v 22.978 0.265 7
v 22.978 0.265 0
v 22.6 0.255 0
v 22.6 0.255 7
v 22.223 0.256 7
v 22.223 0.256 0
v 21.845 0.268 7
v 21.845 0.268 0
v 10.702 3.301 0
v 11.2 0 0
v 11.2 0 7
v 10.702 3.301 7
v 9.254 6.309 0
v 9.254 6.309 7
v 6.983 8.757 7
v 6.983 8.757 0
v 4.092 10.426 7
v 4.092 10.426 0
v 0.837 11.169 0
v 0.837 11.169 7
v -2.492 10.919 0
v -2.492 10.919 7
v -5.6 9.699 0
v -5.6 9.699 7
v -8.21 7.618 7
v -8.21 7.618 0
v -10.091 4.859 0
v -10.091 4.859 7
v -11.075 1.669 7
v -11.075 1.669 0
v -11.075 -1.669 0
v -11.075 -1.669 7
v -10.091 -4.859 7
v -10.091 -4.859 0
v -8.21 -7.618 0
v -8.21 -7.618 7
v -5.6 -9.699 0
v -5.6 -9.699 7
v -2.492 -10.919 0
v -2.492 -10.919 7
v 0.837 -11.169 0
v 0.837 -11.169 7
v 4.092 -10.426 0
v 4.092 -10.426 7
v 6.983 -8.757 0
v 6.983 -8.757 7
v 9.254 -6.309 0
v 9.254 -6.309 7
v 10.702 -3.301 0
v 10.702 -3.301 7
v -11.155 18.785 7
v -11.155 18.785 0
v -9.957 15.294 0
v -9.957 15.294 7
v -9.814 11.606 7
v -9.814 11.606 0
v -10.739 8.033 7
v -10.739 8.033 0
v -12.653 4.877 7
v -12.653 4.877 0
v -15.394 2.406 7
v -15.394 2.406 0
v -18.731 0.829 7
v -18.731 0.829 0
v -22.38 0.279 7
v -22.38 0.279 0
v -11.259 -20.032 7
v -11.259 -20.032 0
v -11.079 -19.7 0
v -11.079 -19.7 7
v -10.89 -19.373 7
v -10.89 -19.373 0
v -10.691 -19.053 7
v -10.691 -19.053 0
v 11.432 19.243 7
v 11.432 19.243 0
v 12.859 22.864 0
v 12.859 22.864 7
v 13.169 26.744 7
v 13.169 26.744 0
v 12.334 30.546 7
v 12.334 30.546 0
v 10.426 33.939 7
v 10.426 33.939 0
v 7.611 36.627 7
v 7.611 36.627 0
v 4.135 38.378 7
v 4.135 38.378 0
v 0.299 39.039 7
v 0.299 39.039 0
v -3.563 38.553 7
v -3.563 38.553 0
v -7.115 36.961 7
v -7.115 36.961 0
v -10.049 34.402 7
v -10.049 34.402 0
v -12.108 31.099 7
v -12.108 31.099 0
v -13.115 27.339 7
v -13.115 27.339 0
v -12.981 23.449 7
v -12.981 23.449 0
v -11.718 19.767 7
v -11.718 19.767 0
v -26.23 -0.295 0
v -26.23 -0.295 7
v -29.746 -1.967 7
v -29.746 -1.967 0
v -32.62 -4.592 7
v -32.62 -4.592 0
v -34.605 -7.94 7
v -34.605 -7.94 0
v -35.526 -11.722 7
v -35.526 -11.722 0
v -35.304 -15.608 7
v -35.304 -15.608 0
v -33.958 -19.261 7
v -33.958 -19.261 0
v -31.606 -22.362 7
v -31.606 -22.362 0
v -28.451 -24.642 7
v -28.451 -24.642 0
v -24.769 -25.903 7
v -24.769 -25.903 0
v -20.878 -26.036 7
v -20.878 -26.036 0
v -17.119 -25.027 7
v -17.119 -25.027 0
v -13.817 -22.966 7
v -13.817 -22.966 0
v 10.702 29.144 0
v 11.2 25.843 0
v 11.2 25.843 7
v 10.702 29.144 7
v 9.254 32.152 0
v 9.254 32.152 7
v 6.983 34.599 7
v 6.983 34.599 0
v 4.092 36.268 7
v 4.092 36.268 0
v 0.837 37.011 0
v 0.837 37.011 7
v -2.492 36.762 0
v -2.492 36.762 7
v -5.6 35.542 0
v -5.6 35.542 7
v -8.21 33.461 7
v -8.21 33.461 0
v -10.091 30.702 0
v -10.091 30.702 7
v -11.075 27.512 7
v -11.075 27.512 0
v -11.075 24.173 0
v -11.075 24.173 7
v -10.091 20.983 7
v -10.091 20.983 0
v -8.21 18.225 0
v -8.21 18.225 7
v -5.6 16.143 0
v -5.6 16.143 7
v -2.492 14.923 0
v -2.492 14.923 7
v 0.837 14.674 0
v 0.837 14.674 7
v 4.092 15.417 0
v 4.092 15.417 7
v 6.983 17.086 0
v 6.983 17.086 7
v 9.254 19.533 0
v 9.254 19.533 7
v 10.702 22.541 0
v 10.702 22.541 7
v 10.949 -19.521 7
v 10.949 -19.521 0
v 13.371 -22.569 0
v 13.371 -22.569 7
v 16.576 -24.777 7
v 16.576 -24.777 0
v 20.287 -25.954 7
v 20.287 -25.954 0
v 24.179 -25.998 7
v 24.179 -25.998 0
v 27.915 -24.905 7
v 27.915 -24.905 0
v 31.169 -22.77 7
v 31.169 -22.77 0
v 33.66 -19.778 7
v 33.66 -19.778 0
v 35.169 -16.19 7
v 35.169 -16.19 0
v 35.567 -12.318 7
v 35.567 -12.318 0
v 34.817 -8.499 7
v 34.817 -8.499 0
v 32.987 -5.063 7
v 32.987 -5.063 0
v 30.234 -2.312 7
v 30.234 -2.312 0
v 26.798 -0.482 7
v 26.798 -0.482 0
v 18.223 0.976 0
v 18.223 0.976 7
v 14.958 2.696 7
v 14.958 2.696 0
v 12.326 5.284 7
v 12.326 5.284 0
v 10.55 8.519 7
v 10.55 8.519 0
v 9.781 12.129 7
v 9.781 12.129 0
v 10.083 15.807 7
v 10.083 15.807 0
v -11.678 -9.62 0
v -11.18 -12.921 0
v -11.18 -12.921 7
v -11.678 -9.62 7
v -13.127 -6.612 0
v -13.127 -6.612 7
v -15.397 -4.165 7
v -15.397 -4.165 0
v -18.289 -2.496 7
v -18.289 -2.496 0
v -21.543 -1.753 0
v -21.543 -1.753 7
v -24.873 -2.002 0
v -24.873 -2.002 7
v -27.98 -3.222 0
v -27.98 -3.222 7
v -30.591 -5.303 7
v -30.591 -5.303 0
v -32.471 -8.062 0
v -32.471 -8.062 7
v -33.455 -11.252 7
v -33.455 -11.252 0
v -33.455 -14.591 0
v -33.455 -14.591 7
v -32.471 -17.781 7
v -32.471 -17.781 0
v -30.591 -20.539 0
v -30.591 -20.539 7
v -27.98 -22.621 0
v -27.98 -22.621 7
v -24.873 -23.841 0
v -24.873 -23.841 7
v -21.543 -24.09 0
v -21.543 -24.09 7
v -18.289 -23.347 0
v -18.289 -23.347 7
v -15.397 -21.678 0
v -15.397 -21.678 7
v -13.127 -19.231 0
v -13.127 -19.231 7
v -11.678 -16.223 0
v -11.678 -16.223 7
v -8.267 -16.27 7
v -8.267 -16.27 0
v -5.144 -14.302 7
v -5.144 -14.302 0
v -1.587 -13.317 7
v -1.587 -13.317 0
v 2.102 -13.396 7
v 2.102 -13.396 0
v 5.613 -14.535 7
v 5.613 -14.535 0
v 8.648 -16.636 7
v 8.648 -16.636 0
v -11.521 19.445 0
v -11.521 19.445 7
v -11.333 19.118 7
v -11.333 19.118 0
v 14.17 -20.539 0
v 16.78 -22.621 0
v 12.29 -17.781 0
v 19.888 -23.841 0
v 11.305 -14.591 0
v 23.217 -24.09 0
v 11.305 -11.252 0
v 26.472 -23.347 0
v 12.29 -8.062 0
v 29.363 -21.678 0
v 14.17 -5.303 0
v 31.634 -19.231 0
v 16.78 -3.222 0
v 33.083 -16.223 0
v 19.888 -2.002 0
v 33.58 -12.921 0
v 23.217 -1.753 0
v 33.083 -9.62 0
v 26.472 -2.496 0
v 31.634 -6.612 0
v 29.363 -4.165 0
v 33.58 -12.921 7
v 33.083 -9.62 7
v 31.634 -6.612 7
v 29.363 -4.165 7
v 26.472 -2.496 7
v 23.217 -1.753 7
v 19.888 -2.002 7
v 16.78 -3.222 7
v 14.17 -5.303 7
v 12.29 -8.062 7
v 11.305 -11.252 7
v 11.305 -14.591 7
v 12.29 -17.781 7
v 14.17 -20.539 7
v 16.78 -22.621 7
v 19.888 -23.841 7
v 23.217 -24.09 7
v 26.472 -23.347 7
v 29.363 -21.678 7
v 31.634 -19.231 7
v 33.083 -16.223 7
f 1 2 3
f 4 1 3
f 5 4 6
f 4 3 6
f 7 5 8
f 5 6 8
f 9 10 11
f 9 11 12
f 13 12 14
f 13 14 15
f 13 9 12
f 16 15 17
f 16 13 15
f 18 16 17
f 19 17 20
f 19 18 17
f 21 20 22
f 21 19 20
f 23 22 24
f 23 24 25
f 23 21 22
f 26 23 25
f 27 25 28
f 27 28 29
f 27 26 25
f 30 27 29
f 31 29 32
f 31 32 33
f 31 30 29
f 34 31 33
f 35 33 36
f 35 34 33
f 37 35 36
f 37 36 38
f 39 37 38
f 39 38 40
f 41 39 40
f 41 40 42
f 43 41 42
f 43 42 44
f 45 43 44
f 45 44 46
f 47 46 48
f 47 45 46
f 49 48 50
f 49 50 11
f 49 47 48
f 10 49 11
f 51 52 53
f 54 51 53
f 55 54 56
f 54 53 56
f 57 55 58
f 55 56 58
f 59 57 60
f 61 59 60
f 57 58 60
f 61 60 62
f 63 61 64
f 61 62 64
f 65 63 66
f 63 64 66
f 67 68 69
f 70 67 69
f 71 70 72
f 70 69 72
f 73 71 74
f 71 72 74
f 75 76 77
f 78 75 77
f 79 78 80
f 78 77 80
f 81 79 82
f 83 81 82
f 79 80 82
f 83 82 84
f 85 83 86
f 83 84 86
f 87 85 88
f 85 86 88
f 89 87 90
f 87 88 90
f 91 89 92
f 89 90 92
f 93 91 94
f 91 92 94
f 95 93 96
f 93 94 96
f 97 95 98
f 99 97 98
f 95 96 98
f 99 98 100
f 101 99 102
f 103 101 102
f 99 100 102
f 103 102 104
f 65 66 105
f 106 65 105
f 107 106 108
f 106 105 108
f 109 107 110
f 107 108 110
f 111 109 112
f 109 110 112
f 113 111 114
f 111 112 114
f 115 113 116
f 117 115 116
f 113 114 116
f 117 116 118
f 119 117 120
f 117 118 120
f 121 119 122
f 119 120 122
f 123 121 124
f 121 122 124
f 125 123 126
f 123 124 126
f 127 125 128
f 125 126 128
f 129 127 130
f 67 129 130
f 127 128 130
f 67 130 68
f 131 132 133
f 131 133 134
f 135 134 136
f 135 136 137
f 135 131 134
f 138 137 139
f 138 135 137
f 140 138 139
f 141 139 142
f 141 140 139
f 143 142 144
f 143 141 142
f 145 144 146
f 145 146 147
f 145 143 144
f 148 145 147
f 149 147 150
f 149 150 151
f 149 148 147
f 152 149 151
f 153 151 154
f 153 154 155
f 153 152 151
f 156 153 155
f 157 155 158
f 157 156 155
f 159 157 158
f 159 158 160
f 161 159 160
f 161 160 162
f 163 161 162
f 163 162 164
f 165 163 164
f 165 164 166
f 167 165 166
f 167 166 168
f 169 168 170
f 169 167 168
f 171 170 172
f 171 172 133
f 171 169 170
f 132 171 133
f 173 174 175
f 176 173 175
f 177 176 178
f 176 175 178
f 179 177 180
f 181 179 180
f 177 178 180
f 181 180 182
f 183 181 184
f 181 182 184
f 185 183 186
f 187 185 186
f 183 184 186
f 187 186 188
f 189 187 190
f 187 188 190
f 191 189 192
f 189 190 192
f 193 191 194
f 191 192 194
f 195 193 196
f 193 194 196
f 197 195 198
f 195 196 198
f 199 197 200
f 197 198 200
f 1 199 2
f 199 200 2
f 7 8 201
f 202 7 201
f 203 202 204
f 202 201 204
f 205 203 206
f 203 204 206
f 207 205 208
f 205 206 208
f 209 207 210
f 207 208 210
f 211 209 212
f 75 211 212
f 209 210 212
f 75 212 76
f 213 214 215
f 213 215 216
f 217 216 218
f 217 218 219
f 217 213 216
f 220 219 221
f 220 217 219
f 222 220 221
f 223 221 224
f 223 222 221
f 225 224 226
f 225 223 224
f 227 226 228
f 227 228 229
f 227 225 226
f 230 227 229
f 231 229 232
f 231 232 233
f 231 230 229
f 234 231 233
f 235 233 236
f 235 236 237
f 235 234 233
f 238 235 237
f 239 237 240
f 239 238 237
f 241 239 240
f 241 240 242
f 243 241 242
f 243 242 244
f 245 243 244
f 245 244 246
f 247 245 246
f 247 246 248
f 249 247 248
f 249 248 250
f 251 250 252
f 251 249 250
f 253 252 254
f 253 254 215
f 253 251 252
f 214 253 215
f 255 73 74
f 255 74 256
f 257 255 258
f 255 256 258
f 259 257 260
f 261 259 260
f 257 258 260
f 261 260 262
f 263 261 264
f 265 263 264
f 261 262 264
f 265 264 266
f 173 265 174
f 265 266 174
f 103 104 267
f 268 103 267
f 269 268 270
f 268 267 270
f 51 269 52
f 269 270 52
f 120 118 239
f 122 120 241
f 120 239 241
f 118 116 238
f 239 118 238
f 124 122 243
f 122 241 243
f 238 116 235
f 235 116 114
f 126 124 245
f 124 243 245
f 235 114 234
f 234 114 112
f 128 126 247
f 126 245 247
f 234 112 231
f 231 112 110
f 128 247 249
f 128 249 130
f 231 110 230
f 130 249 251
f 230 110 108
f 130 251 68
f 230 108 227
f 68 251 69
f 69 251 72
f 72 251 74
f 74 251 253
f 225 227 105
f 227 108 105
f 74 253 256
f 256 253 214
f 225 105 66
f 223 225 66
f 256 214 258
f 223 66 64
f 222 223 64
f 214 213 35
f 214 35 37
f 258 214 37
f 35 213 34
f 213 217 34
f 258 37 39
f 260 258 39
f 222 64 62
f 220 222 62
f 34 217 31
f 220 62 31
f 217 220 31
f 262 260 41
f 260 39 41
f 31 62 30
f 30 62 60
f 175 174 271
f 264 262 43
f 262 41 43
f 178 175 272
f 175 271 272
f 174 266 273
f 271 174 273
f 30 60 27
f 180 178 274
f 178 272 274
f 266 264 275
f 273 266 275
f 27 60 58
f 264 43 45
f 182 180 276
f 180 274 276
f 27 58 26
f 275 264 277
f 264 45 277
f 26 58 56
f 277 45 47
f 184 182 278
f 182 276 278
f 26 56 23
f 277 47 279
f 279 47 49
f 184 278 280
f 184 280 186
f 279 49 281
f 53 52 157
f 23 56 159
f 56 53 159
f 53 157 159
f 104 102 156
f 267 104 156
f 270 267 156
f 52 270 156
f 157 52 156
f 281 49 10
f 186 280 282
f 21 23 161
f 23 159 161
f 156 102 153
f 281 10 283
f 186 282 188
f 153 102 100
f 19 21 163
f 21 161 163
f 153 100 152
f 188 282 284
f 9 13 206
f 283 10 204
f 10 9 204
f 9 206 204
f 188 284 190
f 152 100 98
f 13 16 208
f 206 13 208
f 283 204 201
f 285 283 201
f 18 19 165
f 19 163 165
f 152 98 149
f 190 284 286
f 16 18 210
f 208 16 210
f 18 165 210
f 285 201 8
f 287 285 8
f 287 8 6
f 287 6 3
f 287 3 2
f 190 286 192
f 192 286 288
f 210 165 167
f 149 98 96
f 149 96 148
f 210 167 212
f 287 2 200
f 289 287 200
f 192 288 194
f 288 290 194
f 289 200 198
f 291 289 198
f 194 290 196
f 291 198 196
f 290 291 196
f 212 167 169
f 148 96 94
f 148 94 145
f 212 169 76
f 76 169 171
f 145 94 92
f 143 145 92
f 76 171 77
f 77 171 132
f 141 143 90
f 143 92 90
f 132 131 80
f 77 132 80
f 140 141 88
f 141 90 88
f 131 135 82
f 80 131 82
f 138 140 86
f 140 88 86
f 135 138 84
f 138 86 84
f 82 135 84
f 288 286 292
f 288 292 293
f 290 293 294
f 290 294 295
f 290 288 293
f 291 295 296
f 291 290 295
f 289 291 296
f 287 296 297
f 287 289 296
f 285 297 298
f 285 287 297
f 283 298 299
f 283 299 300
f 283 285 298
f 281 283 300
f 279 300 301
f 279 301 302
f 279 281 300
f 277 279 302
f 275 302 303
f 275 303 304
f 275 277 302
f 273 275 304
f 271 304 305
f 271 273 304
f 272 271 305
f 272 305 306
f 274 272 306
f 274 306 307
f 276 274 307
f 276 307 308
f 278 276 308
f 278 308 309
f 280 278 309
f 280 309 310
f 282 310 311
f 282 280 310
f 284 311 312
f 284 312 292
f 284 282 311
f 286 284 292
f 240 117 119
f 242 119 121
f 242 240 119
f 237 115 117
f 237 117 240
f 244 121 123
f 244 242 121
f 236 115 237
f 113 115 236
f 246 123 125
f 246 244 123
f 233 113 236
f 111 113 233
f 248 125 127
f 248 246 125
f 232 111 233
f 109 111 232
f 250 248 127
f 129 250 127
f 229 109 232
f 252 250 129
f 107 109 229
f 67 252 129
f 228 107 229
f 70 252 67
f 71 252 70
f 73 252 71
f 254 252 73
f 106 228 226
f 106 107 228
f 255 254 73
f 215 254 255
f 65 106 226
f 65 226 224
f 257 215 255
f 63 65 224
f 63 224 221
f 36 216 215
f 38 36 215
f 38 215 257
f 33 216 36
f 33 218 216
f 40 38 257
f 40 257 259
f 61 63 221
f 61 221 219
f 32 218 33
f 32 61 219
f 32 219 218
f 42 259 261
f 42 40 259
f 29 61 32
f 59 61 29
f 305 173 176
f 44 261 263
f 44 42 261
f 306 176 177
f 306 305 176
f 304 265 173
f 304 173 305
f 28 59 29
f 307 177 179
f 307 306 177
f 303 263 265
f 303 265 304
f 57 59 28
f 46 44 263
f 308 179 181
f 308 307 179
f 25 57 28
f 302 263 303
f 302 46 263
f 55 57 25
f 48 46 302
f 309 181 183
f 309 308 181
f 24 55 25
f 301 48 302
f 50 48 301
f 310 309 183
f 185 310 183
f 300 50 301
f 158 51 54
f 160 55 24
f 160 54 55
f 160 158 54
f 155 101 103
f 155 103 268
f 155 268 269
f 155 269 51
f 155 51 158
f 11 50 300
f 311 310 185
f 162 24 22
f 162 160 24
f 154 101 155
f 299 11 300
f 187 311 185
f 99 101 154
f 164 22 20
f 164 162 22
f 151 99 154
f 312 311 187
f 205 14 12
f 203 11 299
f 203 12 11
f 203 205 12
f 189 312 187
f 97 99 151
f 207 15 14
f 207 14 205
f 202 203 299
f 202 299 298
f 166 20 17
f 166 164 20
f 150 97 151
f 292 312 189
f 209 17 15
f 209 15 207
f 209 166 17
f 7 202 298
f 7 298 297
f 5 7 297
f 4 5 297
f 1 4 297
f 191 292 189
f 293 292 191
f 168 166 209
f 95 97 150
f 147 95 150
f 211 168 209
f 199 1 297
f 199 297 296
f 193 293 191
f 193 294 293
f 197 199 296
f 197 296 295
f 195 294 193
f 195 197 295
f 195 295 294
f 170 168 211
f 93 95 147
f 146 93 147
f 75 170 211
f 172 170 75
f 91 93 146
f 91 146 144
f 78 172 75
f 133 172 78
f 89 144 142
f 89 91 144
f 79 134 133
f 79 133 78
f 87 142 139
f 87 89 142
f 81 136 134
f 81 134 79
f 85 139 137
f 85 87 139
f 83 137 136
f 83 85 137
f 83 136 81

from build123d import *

# Parameters (mm, degrees)
F0_R     = 11.2
F1_DEPTH = 7


with BuildPart() as f1:
    # F0 (on Top) → F1 (new body)
    with BuildSketch(Plane.XY):
        with BuildLine():
            ThreePointArc((21.845364, 0.267829), (11.320024, 6.836361), (11.431535, 19.242648))
            ThreePointArc((11.431535, 19.242648), (0.298709, 39.039268), (-11.71846, 19.766654))
            ThreePointArc((-11.71846, 19.766654), (-11.425584, 19.281984), (-11.154628, 18.784726))
            ThreePointArc((-11.154628, 18.784726), (-11.580474, 6.385248), (-22.38039, 0.278676))
            ThreePointArc((-22.38039, 0.278676), (-33.958352, -19.260944), (-11.259195, -20.031811))
            ThreePointArc((-11.259195, -20.031811), (-10.985896, -19.535837), (-10.690736, -19.052554))
            ThreePointArc((-10.690736, -19.052554), (0.26045, -13.221608), (10.948854, -19.521324))
            ThreePointArc((10.948854, -19.521324), (33.659643, -19.778324), (22.977655, 0.265157))
            ThreePointArc((22.977655, 0.265157), (22.41148, 0.253854), (21.845364, 0.267829))
        make_face()
        with Locations((-22.38039, -12.921324)):
            Circle(F0_R, mode=Mode.SUBTRACT)
        with Locations((22.38039, -12.921324)):
            Circle(F0_R, mode=Mode.SUBTRACT)
        Circle(F0_R, mode=Mode.SUBTRACT)
        with Locations((0, 25.842648)):
            Circle(F0_R, mode=Mode.SUBTRACT)
    extrude(amount=F1_DEPTH)


solid = f1.part
